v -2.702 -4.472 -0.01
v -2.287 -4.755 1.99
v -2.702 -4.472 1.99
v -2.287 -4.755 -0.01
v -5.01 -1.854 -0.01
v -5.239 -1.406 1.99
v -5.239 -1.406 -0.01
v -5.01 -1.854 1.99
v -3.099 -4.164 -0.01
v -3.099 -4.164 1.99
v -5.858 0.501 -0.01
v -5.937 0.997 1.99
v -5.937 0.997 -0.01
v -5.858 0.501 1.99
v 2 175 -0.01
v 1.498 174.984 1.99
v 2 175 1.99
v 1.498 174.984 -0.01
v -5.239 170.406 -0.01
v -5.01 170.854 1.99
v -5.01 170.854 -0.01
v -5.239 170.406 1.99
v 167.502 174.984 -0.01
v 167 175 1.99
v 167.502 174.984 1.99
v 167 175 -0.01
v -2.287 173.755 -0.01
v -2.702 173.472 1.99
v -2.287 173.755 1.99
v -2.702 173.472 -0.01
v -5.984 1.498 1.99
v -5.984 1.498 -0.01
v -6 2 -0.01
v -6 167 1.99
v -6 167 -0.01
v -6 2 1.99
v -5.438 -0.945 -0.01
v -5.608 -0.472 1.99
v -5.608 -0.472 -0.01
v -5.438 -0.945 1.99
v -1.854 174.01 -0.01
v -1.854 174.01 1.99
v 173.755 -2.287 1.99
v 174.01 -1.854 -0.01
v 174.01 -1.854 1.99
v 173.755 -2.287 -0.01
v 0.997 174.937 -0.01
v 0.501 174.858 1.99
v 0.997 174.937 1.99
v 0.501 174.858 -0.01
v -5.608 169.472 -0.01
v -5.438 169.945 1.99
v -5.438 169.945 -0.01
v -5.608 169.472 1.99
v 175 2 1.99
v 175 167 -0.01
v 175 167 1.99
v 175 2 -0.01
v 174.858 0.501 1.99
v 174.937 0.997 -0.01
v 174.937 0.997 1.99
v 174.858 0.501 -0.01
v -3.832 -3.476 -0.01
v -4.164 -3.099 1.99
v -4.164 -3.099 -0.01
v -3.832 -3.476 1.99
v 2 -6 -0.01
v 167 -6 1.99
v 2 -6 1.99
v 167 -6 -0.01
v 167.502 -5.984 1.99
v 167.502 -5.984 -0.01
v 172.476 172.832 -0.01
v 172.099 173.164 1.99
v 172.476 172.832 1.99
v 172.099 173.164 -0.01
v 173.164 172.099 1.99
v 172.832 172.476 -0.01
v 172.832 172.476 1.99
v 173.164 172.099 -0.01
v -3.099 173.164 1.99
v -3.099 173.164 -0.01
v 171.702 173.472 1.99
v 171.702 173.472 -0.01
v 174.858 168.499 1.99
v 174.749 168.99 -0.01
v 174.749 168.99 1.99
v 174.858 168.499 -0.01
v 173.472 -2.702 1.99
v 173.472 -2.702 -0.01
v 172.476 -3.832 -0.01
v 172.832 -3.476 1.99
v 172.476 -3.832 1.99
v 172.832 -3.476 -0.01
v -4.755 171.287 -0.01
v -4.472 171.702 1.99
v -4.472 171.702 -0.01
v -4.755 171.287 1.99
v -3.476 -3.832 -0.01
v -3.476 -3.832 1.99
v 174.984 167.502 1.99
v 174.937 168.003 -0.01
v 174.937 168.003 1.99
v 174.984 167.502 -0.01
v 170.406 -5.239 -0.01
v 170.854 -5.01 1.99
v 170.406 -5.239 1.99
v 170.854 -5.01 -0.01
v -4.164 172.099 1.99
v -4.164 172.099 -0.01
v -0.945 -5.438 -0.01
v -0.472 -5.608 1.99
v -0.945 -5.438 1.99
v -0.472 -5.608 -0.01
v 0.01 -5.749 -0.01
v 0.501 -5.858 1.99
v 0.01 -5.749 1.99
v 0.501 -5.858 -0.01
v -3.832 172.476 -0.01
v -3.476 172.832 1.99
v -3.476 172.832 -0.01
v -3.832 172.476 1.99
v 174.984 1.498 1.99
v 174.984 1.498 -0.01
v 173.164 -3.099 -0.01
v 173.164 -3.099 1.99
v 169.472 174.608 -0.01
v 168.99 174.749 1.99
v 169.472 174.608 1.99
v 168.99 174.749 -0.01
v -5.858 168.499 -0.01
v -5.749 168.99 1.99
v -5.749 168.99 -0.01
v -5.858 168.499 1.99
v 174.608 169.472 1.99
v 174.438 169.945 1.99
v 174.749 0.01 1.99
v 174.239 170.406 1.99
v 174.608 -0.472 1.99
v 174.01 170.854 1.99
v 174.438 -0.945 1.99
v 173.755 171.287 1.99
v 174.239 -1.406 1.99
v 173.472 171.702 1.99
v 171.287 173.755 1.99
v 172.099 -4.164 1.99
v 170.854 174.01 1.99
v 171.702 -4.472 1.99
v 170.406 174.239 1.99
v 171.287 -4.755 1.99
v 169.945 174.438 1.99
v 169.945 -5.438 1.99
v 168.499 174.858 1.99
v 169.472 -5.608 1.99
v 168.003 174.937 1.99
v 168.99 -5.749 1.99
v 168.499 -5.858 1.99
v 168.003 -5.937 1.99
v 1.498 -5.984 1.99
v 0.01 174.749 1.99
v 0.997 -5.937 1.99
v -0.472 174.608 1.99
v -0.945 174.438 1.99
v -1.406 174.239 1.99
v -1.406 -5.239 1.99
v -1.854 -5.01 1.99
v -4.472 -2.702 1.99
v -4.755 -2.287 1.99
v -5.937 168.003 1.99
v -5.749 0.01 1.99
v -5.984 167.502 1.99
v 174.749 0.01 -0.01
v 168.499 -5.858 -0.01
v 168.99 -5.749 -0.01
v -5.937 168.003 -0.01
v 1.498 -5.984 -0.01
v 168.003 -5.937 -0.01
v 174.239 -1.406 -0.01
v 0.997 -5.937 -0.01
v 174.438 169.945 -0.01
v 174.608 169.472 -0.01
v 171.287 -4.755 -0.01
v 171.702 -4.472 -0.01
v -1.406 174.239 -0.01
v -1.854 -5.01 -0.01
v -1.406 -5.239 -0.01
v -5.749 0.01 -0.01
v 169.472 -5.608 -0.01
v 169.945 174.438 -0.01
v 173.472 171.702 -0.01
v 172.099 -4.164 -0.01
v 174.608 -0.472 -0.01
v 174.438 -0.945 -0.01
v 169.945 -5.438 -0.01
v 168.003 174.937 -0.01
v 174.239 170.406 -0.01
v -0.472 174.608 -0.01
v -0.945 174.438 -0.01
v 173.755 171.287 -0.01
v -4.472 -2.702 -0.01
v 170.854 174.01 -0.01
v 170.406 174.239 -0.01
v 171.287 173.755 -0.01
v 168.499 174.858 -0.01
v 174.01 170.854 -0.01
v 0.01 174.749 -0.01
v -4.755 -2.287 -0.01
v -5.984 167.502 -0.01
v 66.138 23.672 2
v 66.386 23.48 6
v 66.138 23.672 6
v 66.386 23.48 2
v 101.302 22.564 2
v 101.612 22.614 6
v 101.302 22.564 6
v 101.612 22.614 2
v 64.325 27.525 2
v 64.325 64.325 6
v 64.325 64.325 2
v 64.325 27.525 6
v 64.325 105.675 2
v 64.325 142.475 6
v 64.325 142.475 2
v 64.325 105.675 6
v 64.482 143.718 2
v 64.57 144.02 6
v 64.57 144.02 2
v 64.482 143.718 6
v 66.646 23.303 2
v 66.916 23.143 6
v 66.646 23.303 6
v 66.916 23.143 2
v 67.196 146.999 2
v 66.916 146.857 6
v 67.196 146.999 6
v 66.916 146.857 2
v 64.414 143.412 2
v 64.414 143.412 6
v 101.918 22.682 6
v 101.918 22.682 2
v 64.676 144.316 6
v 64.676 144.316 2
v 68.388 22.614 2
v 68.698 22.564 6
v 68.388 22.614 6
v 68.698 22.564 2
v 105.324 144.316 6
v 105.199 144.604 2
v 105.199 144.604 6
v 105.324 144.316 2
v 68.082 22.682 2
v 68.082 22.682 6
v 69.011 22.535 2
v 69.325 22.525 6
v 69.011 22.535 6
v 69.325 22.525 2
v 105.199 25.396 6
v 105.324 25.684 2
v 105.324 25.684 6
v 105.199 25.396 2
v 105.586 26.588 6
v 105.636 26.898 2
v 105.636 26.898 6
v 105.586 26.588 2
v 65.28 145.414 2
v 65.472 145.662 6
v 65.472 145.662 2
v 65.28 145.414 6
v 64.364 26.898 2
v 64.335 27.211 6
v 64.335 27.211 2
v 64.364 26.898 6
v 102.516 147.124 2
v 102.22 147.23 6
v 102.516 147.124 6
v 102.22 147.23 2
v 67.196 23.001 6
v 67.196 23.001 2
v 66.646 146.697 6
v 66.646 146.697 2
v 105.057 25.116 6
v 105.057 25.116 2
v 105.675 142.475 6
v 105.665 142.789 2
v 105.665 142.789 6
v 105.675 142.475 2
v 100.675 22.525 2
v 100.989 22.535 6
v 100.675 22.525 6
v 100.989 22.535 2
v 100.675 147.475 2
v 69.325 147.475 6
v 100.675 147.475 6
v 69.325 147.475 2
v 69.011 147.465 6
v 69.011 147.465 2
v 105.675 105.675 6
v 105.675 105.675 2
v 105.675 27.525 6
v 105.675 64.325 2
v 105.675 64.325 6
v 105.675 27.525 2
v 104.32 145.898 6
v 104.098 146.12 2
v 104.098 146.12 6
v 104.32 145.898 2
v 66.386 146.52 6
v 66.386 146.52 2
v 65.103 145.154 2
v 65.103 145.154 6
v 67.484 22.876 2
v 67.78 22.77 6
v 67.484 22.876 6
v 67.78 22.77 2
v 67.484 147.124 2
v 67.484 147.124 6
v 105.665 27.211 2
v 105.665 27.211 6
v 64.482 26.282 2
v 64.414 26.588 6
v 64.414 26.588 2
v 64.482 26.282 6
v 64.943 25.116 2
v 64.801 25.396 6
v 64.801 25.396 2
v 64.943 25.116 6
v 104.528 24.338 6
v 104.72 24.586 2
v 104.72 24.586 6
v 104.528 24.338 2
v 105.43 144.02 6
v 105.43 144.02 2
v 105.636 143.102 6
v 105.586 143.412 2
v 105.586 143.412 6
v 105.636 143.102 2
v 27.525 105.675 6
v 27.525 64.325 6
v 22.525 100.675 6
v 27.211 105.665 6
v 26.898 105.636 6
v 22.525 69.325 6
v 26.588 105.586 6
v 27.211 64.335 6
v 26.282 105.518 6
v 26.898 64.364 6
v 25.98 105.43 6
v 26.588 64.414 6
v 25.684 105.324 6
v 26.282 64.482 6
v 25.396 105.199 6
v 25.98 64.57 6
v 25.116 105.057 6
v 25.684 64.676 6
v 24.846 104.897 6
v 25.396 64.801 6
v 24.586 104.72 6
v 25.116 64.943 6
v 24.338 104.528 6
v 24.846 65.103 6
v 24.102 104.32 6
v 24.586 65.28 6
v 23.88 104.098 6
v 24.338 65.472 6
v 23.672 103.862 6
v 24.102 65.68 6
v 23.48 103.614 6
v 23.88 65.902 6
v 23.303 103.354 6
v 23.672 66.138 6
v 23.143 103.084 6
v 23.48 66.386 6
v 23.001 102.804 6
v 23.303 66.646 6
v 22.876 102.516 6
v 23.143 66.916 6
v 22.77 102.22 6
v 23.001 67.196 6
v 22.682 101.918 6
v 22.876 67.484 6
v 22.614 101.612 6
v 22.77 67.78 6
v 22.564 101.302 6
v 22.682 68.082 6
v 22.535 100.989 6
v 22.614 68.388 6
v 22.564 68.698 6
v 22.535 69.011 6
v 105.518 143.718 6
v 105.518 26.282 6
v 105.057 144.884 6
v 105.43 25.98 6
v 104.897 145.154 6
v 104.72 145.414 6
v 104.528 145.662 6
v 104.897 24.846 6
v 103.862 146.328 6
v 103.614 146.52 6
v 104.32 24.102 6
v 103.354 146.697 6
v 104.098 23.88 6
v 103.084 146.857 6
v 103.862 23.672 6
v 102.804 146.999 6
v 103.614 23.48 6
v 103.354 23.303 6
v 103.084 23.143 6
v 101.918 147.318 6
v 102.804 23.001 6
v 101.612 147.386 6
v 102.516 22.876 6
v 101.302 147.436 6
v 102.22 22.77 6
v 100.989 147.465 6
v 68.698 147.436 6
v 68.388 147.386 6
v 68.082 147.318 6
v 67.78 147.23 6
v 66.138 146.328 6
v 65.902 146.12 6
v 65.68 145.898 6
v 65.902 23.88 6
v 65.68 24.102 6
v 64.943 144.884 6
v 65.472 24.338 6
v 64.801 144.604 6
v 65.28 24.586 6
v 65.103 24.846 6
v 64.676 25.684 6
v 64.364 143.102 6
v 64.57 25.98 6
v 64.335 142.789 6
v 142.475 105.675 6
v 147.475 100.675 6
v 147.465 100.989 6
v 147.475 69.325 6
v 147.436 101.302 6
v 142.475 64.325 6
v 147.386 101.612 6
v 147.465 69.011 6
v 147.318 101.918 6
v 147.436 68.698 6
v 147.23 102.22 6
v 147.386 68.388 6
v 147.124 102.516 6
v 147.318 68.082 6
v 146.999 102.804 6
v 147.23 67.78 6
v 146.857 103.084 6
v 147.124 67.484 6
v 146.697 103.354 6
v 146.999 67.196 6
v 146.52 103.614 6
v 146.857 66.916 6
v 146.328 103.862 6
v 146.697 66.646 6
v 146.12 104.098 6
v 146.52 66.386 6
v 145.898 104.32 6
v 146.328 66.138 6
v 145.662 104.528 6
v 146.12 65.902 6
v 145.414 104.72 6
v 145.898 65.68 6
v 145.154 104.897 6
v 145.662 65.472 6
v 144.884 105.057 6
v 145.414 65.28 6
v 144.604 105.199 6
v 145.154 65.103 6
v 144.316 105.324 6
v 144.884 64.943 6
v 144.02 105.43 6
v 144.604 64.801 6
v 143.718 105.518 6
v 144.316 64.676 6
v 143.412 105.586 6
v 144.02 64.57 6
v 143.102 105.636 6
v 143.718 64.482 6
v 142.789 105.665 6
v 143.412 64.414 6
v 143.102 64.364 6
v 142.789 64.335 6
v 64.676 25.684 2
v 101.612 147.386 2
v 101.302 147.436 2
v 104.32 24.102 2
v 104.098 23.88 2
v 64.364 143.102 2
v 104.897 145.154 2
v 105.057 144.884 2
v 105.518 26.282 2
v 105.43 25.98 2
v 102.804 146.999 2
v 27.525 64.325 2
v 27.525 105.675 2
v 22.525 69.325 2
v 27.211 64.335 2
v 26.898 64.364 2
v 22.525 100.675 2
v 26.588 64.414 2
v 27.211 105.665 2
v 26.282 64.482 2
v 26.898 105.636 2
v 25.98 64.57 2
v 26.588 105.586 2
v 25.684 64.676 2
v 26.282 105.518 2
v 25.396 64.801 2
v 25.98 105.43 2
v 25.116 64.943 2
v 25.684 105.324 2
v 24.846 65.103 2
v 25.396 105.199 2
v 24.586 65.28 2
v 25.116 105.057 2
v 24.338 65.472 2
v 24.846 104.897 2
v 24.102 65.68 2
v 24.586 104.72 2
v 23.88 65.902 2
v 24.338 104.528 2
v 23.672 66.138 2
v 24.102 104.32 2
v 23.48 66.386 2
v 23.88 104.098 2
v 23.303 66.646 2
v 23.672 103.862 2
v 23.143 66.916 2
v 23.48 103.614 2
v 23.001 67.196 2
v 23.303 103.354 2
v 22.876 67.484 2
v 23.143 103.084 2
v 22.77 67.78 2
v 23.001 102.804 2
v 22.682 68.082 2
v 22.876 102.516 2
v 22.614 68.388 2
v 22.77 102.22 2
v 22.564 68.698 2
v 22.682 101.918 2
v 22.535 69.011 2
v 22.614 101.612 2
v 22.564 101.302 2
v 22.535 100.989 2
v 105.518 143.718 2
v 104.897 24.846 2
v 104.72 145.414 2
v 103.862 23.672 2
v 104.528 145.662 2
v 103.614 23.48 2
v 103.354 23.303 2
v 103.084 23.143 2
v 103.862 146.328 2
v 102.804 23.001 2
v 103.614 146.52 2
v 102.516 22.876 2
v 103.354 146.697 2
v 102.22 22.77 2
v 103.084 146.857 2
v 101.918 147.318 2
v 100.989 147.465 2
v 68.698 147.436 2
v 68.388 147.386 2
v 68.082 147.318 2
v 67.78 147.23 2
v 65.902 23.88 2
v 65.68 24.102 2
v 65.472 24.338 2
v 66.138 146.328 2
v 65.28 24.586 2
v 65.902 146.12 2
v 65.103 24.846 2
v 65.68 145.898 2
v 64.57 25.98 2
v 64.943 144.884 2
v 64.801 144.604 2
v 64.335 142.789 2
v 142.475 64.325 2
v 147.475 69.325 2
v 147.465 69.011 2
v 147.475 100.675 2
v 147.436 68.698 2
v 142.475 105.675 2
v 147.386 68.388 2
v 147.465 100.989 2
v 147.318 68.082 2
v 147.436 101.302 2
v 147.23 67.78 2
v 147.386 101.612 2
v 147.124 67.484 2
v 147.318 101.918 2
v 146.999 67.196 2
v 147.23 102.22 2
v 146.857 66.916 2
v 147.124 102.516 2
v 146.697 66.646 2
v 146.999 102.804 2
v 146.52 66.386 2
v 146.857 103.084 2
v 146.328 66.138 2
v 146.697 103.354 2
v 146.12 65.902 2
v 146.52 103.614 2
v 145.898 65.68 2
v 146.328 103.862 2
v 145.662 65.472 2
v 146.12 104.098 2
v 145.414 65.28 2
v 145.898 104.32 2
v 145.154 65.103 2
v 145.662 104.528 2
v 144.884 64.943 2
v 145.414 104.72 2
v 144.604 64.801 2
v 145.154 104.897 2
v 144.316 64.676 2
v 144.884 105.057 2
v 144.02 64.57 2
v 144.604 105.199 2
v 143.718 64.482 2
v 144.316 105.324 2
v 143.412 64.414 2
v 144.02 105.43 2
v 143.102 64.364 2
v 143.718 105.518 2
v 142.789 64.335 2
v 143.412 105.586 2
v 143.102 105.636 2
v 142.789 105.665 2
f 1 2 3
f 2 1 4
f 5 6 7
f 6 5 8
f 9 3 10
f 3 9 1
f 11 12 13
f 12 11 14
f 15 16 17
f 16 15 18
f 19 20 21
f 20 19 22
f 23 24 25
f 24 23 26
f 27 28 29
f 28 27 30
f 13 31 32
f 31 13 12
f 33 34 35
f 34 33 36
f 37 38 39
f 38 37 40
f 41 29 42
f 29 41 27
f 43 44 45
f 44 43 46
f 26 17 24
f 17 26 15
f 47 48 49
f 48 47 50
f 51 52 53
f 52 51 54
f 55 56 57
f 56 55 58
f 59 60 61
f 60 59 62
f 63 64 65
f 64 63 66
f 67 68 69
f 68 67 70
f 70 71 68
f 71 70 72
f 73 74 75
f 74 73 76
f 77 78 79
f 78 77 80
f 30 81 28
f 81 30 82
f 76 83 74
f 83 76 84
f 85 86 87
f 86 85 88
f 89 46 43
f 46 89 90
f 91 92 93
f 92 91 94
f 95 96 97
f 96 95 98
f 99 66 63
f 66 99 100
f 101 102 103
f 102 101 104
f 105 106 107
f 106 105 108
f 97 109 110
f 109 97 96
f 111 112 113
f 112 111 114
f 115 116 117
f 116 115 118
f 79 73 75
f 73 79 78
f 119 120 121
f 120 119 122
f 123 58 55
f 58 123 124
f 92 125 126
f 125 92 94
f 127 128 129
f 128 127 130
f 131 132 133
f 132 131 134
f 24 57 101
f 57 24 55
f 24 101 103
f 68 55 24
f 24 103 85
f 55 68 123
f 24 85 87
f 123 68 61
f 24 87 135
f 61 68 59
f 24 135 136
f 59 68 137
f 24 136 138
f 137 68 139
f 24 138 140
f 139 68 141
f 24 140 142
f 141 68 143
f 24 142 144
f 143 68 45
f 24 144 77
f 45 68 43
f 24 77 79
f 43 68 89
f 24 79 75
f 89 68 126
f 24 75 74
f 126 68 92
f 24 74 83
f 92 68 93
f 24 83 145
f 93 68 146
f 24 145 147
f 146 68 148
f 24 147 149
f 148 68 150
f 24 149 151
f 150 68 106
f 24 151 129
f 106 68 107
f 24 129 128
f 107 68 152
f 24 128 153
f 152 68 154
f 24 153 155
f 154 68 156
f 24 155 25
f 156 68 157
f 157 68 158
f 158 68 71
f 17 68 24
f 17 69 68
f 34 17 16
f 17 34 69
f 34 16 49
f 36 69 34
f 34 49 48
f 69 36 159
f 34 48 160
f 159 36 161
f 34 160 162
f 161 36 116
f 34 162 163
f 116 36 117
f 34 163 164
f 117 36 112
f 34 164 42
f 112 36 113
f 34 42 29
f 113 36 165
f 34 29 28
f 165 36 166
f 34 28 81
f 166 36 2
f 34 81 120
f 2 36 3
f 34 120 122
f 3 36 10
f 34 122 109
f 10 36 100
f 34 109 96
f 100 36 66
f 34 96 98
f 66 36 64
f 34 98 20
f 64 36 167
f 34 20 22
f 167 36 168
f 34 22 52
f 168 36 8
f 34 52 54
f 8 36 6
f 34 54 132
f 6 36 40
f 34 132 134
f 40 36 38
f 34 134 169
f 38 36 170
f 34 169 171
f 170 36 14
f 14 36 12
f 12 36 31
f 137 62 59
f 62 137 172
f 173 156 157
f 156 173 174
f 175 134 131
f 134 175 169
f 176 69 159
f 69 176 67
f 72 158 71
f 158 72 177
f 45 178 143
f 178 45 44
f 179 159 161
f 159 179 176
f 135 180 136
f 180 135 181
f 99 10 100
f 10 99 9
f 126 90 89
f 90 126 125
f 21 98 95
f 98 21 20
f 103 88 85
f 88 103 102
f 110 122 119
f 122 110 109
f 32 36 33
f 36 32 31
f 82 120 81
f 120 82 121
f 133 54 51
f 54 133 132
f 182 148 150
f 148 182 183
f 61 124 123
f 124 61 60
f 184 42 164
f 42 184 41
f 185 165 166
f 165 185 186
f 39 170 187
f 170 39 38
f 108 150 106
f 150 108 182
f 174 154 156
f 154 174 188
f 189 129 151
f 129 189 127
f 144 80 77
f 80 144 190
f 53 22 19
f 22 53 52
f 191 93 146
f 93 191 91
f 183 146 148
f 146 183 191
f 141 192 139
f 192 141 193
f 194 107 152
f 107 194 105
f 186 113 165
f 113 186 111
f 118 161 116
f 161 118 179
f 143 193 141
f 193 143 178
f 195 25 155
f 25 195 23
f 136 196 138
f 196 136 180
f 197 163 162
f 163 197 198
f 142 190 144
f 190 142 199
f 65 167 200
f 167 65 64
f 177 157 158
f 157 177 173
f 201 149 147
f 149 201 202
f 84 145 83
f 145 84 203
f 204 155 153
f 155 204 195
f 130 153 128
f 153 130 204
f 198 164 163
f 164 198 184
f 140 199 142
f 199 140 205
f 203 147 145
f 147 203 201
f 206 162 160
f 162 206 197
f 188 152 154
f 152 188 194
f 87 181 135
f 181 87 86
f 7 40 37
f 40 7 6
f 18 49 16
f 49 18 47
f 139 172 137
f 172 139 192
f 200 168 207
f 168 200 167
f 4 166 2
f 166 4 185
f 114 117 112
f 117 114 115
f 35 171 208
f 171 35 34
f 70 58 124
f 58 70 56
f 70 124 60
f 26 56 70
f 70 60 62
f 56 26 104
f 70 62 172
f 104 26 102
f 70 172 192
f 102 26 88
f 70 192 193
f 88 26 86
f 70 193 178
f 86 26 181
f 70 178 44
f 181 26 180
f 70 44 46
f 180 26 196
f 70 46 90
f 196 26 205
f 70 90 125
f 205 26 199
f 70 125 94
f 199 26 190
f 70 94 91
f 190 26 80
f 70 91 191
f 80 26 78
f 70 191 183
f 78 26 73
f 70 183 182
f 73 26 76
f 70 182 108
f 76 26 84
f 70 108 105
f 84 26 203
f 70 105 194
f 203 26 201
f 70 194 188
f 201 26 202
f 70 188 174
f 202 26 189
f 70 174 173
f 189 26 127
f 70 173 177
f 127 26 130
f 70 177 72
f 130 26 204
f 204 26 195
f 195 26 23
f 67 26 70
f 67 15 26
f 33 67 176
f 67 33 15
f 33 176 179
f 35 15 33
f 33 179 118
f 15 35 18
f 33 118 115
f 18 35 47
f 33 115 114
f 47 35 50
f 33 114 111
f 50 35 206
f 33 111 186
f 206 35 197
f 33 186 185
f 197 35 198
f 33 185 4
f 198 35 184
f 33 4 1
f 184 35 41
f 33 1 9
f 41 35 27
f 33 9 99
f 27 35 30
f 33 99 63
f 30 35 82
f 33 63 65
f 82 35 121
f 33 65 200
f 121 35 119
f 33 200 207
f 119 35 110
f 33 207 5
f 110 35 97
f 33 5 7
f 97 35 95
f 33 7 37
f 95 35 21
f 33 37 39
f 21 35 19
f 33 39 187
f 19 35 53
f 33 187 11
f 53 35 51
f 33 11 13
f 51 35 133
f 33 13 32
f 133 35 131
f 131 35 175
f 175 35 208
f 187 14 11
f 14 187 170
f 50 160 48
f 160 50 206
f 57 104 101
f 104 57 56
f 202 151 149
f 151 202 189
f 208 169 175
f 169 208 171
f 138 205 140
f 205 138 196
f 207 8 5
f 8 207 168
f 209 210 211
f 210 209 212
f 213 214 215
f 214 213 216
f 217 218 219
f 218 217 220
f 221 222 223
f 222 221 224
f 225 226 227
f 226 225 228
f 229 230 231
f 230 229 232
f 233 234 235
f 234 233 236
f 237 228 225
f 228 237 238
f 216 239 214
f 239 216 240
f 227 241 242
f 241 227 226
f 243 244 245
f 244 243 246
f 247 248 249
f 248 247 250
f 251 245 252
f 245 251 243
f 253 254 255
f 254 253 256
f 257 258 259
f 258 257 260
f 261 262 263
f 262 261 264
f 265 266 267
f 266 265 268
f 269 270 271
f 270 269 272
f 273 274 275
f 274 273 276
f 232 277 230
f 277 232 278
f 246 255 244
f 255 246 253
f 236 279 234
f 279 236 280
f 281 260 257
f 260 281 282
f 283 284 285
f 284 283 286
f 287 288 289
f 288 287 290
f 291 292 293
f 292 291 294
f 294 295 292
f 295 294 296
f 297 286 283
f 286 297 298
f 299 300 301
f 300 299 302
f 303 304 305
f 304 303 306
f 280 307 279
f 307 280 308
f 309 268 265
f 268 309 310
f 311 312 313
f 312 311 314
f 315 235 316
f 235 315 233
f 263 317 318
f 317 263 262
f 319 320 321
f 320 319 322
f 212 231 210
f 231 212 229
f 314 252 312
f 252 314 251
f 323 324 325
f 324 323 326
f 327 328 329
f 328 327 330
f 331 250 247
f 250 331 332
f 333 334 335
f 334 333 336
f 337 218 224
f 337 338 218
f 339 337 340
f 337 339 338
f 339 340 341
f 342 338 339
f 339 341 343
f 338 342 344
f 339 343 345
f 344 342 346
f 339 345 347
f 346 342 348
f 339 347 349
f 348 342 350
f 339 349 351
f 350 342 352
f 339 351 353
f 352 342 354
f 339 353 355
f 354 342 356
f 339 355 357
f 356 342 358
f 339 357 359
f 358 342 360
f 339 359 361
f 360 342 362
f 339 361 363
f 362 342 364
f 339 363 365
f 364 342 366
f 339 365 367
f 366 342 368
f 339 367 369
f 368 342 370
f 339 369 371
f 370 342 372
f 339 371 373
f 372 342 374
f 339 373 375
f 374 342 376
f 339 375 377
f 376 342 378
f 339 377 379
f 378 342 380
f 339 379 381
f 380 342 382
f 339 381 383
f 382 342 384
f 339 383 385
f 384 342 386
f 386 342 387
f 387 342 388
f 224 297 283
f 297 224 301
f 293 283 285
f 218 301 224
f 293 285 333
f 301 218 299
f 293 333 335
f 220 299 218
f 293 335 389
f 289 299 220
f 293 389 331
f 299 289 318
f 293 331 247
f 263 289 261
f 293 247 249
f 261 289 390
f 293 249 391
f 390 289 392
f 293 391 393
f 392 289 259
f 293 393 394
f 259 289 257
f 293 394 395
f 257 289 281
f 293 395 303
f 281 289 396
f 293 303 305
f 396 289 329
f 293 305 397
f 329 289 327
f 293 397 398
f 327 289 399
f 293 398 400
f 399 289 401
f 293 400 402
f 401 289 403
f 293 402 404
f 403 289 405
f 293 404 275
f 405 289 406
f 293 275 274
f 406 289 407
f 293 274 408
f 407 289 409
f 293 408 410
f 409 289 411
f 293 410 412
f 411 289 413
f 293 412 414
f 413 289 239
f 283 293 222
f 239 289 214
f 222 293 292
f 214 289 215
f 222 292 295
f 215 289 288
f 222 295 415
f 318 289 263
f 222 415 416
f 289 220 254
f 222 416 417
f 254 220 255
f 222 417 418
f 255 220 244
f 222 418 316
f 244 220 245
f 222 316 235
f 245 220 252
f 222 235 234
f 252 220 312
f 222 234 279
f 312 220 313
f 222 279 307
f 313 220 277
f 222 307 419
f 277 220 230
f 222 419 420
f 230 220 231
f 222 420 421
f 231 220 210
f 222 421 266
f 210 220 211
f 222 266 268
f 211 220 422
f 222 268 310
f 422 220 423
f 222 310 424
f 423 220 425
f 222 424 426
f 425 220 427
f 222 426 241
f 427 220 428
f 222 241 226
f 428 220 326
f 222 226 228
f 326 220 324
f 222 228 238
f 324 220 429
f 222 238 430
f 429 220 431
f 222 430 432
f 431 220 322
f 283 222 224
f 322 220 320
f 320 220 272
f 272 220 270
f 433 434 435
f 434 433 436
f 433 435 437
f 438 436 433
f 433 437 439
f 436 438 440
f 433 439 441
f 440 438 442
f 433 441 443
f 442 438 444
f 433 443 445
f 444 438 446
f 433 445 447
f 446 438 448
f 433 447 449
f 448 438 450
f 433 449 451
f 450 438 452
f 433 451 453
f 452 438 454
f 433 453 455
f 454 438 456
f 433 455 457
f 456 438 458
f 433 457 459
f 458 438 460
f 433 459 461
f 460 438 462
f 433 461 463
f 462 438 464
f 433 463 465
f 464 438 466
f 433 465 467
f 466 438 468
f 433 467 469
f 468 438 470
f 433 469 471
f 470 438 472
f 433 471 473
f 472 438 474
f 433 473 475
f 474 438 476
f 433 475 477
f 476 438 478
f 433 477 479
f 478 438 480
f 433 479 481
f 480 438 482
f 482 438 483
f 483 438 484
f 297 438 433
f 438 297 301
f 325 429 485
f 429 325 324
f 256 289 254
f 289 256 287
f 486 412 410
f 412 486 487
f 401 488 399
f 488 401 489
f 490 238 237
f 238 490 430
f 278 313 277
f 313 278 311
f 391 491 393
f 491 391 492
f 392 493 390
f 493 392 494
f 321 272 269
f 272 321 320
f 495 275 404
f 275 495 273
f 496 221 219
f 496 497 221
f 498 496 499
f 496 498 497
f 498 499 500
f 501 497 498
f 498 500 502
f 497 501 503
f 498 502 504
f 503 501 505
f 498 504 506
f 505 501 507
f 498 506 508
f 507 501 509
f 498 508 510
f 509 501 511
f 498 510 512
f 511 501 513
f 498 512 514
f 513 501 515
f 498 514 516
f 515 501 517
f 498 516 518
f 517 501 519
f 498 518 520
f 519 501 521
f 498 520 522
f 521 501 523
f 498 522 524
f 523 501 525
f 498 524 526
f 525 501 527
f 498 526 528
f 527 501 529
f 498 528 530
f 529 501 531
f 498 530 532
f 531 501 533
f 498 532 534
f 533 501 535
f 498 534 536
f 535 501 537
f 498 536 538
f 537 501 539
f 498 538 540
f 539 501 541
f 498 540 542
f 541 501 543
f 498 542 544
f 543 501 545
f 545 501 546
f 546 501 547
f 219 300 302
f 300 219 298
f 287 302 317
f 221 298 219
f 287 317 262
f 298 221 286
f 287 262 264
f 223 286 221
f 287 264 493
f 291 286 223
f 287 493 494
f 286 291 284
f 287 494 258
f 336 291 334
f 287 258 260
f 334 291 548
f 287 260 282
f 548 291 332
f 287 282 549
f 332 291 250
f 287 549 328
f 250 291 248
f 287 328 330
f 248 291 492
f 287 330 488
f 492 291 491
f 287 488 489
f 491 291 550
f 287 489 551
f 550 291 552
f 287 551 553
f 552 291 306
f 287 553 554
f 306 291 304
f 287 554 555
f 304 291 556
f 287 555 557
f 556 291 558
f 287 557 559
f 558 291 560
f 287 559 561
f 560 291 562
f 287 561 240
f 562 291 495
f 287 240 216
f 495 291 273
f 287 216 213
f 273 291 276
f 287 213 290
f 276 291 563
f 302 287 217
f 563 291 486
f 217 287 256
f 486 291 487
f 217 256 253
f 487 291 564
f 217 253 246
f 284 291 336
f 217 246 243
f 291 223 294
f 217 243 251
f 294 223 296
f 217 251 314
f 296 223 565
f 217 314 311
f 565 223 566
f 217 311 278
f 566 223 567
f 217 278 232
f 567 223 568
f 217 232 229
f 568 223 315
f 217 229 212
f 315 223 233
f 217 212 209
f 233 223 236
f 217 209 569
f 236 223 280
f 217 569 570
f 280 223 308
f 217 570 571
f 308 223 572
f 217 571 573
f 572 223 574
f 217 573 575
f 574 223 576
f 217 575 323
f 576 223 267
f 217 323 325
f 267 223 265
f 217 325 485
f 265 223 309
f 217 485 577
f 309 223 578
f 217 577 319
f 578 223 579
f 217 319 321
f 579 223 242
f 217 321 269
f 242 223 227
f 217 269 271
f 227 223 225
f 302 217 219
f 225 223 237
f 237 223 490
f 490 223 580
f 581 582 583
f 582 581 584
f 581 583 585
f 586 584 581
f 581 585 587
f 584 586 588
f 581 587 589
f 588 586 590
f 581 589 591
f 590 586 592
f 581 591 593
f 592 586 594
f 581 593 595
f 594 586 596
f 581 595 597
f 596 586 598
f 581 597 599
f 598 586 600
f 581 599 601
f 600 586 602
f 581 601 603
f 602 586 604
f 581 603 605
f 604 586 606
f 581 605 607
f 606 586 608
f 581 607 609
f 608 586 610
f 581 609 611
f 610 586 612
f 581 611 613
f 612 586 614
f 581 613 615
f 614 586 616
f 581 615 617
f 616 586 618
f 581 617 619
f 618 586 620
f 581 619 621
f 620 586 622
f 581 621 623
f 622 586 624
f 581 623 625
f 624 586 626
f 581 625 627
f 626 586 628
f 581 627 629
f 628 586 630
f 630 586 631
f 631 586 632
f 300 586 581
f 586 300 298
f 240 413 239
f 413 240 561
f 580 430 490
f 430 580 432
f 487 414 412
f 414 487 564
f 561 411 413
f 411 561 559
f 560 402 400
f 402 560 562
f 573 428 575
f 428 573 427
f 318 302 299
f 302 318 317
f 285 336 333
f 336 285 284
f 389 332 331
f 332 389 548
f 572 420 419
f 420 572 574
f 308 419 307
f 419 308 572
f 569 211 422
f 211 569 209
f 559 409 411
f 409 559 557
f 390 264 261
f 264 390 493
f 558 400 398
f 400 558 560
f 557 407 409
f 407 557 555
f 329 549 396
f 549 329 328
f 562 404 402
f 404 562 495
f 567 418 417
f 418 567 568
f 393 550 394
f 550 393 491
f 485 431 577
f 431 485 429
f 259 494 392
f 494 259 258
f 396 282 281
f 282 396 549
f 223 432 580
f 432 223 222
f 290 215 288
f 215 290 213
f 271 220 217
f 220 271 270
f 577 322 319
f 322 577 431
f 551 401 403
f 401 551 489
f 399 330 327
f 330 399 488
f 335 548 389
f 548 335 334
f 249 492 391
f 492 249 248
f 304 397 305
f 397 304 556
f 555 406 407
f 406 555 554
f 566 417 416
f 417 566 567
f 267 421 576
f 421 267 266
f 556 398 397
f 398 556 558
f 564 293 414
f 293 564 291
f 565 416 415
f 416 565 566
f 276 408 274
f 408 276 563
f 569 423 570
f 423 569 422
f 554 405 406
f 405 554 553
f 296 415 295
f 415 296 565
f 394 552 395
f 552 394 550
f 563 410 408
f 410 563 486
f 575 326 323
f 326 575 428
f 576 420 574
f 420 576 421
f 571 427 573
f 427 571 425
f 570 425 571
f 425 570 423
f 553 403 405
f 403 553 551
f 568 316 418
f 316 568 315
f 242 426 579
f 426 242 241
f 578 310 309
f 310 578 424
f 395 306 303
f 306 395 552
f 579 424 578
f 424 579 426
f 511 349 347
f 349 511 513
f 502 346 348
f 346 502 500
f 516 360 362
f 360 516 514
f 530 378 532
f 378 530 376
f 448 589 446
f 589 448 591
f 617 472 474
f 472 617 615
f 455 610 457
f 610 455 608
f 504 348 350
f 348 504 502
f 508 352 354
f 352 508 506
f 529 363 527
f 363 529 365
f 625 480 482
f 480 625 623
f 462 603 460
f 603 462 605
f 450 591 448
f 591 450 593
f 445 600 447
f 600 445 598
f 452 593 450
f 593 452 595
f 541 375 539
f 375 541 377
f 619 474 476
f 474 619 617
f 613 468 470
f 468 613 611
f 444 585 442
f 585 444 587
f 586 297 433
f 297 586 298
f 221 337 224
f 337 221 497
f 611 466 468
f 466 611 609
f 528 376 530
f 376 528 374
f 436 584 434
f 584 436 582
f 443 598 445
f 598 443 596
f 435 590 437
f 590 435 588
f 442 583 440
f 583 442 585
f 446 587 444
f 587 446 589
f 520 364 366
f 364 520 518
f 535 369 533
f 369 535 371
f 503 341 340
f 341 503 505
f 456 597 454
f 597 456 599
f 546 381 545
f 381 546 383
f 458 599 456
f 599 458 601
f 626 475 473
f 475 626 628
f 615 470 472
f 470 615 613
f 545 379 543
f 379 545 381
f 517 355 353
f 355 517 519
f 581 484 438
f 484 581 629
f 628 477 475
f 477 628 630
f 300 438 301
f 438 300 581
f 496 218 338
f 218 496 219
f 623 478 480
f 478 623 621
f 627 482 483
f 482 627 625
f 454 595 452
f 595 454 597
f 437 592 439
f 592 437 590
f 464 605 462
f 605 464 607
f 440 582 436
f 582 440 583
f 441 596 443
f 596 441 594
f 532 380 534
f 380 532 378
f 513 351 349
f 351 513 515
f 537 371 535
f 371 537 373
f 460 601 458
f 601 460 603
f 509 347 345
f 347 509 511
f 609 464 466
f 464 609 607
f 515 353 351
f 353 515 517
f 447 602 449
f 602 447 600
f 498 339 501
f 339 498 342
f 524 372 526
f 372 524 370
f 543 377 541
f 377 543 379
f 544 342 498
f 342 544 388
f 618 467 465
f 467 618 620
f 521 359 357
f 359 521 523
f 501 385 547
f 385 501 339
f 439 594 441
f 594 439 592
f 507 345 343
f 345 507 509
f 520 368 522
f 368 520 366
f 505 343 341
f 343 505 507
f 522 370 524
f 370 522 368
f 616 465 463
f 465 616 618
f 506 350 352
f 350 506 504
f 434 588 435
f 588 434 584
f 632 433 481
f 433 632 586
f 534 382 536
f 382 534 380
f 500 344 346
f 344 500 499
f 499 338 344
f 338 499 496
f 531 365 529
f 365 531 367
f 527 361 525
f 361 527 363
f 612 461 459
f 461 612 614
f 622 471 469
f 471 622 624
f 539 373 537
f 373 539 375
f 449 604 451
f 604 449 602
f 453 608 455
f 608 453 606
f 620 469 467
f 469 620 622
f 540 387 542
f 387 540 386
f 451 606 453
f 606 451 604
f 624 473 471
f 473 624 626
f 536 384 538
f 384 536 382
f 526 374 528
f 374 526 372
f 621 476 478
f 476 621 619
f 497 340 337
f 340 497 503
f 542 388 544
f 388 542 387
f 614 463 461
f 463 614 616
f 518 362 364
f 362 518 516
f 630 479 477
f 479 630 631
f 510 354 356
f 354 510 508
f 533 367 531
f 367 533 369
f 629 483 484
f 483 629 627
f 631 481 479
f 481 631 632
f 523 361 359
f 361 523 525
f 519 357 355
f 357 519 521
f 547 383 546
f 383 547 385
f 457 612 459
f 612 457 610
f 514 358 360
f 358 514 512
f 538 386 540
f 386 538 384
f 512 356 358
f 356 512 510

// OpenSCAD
$fn = 100;

module box(l=200,d=20,h=100,t=5)
{
   
    a = l-2*d;
    h_ = h-t;
    a_ = a-t;
    d_ = d -t;
    difference()
    {
        //base
        hull()
        {
            cylinder(d=d,h=h);
            translate([a,0,0]) cylinder(d=d,h=h);
            translate([a,a,0]) cylinder(d=d,h=h);
            translate([0,a,0]) cylinder(d=d,h=h);
        }
        
        //cut
        translate([t/2,t/2,t+0.01])
        hull()
        {
            cylinder(d=d_,h=h_);
            translate([a_,0,0]) cylinder(d=d_,h=h_);
            translate([a_,a_,0]) cylinder(d=d_,h=h_);
            translate([0,a_,0]) cylinder(d=d_,h=h_);            
        }
        
    }
}

module cover(l=210, d=20, h=25, t=4)
{
    a = l-2*d;
    h_ = h-t;
    a_ = a-t;
    d_ = d -t;
    
    difference()
    {
        //base
        hull()
        {
            cylinder(d=d,h=h);
            translate([a,0,0]) cylinder(d=d,h=h);
            translate([a,a,0]) cylinder(d=d,h=h);
            translate([0,a,0]) cylinder(d=d,h=h);
        }
        
        //cut
        translate([t/2,t/2,-0.01])
        hull()
        {
            cylinder(d=d_,h=h_);
            translate([a_,0,0]) cylinder(d=d_,h=h_);
            translate([a_,a_,0]) cylinder(d=d_,h=h_);
            translate([0,a_,0]) cylinder(d=d_,h=h_);            
        }
        
        d_l = l;
        //cross diagonal
        #translate([l/2-d,l/2-d,1.5*t])
            hull(){
                translate([0.075*d_l,0.275*d_l,h/2]) cylinder(d=d/2,h=h/2);
                translate([0.075*d_l,-0.275*d_l,h/2]) cylinder(d=d/2,h=h/2);
                translate([-0.075*d_l,-0.275*d_l,h/2]) cylinder(d=d/2,h=h/2);
                translate([-0.075*d_l,0.275*d_l,h/2]) cylinder(d=d/2,h=h/2);
            }           
        
        //cross vertical
        #translate([l/2-d,l/2-d,1.5*t])
            hull(){
                translate([0.275*d_l,0.075*d_l,h/2]) cylinder(d=d/2,h=h/2);
                translate([0.275*d_l,-0.075*d_l,h/2]) cylinder(d=d/2,h=h/2);
                translate([-0.275*d_l,-0.075*d_l,h/2]) cylinder(d=d/2,h=h/2);
                translate([-0.275*d_l,0.075*d_l,h/2]) cylinder(d=d/2,h=h/2);
            }
    }
    
}

module cross(l=210,d=20,t=4){
    //cut
    a = l-2*d;
    a_ = a-t -1;
    d_ = d -t;
    translate([t/2,t/2,-0.01])
    hull()
    {
        cylinder(d=d_,h=t/2);
        translate([a_,0,0]) cylinder(d=d_,h=t/2);
        translate([a_,a_,0]) cylinder(d=d_,h=t/2);
        translate([0,a_,0]) cylinder(d=d_,h=t/2);            
    }
    
    d_l = l-1;
    //cross diagonal
    translate([l/2-d,l/2-d,0])
        hull(){
            translate([0.075*d_l,0.275*d_l,t/2]) cylinder(d=d/2,h=t);
            translate([0.075*d_l,-0.275*d_l,t/2]) cylinder(d=d/2,h=t);
            translate([-0.075*d_l,-0.275*d_l,t/2]) cylinder(d=d/2,h=t);
            translate([-0.075*d_l,0.275*d_l,t/2]) cylinder(d=d/2,h=t);
        }           
        
    //cross vertical
    translate([l/2-d,l/2-d,0])
        hull(){
            translate([0.275*d_l,0.075*d_l,t/2]) cylinder(d=d/2,h=t);
            translate([0.275*d_l,-0.075*d_l,t/2]) cylinder(d=d/2,h=t);
            translate([-0.275*d_l,-0.075*d_l,t/2]) cylinder(d=d/2,h=t);
            translate([-0.275*d_l,0.075*d_l,t/2]) cylinder(d=d/2,h=t);
        }
}

//box();

//translate([-5,-5,100-20])
//%cover();
cross();
